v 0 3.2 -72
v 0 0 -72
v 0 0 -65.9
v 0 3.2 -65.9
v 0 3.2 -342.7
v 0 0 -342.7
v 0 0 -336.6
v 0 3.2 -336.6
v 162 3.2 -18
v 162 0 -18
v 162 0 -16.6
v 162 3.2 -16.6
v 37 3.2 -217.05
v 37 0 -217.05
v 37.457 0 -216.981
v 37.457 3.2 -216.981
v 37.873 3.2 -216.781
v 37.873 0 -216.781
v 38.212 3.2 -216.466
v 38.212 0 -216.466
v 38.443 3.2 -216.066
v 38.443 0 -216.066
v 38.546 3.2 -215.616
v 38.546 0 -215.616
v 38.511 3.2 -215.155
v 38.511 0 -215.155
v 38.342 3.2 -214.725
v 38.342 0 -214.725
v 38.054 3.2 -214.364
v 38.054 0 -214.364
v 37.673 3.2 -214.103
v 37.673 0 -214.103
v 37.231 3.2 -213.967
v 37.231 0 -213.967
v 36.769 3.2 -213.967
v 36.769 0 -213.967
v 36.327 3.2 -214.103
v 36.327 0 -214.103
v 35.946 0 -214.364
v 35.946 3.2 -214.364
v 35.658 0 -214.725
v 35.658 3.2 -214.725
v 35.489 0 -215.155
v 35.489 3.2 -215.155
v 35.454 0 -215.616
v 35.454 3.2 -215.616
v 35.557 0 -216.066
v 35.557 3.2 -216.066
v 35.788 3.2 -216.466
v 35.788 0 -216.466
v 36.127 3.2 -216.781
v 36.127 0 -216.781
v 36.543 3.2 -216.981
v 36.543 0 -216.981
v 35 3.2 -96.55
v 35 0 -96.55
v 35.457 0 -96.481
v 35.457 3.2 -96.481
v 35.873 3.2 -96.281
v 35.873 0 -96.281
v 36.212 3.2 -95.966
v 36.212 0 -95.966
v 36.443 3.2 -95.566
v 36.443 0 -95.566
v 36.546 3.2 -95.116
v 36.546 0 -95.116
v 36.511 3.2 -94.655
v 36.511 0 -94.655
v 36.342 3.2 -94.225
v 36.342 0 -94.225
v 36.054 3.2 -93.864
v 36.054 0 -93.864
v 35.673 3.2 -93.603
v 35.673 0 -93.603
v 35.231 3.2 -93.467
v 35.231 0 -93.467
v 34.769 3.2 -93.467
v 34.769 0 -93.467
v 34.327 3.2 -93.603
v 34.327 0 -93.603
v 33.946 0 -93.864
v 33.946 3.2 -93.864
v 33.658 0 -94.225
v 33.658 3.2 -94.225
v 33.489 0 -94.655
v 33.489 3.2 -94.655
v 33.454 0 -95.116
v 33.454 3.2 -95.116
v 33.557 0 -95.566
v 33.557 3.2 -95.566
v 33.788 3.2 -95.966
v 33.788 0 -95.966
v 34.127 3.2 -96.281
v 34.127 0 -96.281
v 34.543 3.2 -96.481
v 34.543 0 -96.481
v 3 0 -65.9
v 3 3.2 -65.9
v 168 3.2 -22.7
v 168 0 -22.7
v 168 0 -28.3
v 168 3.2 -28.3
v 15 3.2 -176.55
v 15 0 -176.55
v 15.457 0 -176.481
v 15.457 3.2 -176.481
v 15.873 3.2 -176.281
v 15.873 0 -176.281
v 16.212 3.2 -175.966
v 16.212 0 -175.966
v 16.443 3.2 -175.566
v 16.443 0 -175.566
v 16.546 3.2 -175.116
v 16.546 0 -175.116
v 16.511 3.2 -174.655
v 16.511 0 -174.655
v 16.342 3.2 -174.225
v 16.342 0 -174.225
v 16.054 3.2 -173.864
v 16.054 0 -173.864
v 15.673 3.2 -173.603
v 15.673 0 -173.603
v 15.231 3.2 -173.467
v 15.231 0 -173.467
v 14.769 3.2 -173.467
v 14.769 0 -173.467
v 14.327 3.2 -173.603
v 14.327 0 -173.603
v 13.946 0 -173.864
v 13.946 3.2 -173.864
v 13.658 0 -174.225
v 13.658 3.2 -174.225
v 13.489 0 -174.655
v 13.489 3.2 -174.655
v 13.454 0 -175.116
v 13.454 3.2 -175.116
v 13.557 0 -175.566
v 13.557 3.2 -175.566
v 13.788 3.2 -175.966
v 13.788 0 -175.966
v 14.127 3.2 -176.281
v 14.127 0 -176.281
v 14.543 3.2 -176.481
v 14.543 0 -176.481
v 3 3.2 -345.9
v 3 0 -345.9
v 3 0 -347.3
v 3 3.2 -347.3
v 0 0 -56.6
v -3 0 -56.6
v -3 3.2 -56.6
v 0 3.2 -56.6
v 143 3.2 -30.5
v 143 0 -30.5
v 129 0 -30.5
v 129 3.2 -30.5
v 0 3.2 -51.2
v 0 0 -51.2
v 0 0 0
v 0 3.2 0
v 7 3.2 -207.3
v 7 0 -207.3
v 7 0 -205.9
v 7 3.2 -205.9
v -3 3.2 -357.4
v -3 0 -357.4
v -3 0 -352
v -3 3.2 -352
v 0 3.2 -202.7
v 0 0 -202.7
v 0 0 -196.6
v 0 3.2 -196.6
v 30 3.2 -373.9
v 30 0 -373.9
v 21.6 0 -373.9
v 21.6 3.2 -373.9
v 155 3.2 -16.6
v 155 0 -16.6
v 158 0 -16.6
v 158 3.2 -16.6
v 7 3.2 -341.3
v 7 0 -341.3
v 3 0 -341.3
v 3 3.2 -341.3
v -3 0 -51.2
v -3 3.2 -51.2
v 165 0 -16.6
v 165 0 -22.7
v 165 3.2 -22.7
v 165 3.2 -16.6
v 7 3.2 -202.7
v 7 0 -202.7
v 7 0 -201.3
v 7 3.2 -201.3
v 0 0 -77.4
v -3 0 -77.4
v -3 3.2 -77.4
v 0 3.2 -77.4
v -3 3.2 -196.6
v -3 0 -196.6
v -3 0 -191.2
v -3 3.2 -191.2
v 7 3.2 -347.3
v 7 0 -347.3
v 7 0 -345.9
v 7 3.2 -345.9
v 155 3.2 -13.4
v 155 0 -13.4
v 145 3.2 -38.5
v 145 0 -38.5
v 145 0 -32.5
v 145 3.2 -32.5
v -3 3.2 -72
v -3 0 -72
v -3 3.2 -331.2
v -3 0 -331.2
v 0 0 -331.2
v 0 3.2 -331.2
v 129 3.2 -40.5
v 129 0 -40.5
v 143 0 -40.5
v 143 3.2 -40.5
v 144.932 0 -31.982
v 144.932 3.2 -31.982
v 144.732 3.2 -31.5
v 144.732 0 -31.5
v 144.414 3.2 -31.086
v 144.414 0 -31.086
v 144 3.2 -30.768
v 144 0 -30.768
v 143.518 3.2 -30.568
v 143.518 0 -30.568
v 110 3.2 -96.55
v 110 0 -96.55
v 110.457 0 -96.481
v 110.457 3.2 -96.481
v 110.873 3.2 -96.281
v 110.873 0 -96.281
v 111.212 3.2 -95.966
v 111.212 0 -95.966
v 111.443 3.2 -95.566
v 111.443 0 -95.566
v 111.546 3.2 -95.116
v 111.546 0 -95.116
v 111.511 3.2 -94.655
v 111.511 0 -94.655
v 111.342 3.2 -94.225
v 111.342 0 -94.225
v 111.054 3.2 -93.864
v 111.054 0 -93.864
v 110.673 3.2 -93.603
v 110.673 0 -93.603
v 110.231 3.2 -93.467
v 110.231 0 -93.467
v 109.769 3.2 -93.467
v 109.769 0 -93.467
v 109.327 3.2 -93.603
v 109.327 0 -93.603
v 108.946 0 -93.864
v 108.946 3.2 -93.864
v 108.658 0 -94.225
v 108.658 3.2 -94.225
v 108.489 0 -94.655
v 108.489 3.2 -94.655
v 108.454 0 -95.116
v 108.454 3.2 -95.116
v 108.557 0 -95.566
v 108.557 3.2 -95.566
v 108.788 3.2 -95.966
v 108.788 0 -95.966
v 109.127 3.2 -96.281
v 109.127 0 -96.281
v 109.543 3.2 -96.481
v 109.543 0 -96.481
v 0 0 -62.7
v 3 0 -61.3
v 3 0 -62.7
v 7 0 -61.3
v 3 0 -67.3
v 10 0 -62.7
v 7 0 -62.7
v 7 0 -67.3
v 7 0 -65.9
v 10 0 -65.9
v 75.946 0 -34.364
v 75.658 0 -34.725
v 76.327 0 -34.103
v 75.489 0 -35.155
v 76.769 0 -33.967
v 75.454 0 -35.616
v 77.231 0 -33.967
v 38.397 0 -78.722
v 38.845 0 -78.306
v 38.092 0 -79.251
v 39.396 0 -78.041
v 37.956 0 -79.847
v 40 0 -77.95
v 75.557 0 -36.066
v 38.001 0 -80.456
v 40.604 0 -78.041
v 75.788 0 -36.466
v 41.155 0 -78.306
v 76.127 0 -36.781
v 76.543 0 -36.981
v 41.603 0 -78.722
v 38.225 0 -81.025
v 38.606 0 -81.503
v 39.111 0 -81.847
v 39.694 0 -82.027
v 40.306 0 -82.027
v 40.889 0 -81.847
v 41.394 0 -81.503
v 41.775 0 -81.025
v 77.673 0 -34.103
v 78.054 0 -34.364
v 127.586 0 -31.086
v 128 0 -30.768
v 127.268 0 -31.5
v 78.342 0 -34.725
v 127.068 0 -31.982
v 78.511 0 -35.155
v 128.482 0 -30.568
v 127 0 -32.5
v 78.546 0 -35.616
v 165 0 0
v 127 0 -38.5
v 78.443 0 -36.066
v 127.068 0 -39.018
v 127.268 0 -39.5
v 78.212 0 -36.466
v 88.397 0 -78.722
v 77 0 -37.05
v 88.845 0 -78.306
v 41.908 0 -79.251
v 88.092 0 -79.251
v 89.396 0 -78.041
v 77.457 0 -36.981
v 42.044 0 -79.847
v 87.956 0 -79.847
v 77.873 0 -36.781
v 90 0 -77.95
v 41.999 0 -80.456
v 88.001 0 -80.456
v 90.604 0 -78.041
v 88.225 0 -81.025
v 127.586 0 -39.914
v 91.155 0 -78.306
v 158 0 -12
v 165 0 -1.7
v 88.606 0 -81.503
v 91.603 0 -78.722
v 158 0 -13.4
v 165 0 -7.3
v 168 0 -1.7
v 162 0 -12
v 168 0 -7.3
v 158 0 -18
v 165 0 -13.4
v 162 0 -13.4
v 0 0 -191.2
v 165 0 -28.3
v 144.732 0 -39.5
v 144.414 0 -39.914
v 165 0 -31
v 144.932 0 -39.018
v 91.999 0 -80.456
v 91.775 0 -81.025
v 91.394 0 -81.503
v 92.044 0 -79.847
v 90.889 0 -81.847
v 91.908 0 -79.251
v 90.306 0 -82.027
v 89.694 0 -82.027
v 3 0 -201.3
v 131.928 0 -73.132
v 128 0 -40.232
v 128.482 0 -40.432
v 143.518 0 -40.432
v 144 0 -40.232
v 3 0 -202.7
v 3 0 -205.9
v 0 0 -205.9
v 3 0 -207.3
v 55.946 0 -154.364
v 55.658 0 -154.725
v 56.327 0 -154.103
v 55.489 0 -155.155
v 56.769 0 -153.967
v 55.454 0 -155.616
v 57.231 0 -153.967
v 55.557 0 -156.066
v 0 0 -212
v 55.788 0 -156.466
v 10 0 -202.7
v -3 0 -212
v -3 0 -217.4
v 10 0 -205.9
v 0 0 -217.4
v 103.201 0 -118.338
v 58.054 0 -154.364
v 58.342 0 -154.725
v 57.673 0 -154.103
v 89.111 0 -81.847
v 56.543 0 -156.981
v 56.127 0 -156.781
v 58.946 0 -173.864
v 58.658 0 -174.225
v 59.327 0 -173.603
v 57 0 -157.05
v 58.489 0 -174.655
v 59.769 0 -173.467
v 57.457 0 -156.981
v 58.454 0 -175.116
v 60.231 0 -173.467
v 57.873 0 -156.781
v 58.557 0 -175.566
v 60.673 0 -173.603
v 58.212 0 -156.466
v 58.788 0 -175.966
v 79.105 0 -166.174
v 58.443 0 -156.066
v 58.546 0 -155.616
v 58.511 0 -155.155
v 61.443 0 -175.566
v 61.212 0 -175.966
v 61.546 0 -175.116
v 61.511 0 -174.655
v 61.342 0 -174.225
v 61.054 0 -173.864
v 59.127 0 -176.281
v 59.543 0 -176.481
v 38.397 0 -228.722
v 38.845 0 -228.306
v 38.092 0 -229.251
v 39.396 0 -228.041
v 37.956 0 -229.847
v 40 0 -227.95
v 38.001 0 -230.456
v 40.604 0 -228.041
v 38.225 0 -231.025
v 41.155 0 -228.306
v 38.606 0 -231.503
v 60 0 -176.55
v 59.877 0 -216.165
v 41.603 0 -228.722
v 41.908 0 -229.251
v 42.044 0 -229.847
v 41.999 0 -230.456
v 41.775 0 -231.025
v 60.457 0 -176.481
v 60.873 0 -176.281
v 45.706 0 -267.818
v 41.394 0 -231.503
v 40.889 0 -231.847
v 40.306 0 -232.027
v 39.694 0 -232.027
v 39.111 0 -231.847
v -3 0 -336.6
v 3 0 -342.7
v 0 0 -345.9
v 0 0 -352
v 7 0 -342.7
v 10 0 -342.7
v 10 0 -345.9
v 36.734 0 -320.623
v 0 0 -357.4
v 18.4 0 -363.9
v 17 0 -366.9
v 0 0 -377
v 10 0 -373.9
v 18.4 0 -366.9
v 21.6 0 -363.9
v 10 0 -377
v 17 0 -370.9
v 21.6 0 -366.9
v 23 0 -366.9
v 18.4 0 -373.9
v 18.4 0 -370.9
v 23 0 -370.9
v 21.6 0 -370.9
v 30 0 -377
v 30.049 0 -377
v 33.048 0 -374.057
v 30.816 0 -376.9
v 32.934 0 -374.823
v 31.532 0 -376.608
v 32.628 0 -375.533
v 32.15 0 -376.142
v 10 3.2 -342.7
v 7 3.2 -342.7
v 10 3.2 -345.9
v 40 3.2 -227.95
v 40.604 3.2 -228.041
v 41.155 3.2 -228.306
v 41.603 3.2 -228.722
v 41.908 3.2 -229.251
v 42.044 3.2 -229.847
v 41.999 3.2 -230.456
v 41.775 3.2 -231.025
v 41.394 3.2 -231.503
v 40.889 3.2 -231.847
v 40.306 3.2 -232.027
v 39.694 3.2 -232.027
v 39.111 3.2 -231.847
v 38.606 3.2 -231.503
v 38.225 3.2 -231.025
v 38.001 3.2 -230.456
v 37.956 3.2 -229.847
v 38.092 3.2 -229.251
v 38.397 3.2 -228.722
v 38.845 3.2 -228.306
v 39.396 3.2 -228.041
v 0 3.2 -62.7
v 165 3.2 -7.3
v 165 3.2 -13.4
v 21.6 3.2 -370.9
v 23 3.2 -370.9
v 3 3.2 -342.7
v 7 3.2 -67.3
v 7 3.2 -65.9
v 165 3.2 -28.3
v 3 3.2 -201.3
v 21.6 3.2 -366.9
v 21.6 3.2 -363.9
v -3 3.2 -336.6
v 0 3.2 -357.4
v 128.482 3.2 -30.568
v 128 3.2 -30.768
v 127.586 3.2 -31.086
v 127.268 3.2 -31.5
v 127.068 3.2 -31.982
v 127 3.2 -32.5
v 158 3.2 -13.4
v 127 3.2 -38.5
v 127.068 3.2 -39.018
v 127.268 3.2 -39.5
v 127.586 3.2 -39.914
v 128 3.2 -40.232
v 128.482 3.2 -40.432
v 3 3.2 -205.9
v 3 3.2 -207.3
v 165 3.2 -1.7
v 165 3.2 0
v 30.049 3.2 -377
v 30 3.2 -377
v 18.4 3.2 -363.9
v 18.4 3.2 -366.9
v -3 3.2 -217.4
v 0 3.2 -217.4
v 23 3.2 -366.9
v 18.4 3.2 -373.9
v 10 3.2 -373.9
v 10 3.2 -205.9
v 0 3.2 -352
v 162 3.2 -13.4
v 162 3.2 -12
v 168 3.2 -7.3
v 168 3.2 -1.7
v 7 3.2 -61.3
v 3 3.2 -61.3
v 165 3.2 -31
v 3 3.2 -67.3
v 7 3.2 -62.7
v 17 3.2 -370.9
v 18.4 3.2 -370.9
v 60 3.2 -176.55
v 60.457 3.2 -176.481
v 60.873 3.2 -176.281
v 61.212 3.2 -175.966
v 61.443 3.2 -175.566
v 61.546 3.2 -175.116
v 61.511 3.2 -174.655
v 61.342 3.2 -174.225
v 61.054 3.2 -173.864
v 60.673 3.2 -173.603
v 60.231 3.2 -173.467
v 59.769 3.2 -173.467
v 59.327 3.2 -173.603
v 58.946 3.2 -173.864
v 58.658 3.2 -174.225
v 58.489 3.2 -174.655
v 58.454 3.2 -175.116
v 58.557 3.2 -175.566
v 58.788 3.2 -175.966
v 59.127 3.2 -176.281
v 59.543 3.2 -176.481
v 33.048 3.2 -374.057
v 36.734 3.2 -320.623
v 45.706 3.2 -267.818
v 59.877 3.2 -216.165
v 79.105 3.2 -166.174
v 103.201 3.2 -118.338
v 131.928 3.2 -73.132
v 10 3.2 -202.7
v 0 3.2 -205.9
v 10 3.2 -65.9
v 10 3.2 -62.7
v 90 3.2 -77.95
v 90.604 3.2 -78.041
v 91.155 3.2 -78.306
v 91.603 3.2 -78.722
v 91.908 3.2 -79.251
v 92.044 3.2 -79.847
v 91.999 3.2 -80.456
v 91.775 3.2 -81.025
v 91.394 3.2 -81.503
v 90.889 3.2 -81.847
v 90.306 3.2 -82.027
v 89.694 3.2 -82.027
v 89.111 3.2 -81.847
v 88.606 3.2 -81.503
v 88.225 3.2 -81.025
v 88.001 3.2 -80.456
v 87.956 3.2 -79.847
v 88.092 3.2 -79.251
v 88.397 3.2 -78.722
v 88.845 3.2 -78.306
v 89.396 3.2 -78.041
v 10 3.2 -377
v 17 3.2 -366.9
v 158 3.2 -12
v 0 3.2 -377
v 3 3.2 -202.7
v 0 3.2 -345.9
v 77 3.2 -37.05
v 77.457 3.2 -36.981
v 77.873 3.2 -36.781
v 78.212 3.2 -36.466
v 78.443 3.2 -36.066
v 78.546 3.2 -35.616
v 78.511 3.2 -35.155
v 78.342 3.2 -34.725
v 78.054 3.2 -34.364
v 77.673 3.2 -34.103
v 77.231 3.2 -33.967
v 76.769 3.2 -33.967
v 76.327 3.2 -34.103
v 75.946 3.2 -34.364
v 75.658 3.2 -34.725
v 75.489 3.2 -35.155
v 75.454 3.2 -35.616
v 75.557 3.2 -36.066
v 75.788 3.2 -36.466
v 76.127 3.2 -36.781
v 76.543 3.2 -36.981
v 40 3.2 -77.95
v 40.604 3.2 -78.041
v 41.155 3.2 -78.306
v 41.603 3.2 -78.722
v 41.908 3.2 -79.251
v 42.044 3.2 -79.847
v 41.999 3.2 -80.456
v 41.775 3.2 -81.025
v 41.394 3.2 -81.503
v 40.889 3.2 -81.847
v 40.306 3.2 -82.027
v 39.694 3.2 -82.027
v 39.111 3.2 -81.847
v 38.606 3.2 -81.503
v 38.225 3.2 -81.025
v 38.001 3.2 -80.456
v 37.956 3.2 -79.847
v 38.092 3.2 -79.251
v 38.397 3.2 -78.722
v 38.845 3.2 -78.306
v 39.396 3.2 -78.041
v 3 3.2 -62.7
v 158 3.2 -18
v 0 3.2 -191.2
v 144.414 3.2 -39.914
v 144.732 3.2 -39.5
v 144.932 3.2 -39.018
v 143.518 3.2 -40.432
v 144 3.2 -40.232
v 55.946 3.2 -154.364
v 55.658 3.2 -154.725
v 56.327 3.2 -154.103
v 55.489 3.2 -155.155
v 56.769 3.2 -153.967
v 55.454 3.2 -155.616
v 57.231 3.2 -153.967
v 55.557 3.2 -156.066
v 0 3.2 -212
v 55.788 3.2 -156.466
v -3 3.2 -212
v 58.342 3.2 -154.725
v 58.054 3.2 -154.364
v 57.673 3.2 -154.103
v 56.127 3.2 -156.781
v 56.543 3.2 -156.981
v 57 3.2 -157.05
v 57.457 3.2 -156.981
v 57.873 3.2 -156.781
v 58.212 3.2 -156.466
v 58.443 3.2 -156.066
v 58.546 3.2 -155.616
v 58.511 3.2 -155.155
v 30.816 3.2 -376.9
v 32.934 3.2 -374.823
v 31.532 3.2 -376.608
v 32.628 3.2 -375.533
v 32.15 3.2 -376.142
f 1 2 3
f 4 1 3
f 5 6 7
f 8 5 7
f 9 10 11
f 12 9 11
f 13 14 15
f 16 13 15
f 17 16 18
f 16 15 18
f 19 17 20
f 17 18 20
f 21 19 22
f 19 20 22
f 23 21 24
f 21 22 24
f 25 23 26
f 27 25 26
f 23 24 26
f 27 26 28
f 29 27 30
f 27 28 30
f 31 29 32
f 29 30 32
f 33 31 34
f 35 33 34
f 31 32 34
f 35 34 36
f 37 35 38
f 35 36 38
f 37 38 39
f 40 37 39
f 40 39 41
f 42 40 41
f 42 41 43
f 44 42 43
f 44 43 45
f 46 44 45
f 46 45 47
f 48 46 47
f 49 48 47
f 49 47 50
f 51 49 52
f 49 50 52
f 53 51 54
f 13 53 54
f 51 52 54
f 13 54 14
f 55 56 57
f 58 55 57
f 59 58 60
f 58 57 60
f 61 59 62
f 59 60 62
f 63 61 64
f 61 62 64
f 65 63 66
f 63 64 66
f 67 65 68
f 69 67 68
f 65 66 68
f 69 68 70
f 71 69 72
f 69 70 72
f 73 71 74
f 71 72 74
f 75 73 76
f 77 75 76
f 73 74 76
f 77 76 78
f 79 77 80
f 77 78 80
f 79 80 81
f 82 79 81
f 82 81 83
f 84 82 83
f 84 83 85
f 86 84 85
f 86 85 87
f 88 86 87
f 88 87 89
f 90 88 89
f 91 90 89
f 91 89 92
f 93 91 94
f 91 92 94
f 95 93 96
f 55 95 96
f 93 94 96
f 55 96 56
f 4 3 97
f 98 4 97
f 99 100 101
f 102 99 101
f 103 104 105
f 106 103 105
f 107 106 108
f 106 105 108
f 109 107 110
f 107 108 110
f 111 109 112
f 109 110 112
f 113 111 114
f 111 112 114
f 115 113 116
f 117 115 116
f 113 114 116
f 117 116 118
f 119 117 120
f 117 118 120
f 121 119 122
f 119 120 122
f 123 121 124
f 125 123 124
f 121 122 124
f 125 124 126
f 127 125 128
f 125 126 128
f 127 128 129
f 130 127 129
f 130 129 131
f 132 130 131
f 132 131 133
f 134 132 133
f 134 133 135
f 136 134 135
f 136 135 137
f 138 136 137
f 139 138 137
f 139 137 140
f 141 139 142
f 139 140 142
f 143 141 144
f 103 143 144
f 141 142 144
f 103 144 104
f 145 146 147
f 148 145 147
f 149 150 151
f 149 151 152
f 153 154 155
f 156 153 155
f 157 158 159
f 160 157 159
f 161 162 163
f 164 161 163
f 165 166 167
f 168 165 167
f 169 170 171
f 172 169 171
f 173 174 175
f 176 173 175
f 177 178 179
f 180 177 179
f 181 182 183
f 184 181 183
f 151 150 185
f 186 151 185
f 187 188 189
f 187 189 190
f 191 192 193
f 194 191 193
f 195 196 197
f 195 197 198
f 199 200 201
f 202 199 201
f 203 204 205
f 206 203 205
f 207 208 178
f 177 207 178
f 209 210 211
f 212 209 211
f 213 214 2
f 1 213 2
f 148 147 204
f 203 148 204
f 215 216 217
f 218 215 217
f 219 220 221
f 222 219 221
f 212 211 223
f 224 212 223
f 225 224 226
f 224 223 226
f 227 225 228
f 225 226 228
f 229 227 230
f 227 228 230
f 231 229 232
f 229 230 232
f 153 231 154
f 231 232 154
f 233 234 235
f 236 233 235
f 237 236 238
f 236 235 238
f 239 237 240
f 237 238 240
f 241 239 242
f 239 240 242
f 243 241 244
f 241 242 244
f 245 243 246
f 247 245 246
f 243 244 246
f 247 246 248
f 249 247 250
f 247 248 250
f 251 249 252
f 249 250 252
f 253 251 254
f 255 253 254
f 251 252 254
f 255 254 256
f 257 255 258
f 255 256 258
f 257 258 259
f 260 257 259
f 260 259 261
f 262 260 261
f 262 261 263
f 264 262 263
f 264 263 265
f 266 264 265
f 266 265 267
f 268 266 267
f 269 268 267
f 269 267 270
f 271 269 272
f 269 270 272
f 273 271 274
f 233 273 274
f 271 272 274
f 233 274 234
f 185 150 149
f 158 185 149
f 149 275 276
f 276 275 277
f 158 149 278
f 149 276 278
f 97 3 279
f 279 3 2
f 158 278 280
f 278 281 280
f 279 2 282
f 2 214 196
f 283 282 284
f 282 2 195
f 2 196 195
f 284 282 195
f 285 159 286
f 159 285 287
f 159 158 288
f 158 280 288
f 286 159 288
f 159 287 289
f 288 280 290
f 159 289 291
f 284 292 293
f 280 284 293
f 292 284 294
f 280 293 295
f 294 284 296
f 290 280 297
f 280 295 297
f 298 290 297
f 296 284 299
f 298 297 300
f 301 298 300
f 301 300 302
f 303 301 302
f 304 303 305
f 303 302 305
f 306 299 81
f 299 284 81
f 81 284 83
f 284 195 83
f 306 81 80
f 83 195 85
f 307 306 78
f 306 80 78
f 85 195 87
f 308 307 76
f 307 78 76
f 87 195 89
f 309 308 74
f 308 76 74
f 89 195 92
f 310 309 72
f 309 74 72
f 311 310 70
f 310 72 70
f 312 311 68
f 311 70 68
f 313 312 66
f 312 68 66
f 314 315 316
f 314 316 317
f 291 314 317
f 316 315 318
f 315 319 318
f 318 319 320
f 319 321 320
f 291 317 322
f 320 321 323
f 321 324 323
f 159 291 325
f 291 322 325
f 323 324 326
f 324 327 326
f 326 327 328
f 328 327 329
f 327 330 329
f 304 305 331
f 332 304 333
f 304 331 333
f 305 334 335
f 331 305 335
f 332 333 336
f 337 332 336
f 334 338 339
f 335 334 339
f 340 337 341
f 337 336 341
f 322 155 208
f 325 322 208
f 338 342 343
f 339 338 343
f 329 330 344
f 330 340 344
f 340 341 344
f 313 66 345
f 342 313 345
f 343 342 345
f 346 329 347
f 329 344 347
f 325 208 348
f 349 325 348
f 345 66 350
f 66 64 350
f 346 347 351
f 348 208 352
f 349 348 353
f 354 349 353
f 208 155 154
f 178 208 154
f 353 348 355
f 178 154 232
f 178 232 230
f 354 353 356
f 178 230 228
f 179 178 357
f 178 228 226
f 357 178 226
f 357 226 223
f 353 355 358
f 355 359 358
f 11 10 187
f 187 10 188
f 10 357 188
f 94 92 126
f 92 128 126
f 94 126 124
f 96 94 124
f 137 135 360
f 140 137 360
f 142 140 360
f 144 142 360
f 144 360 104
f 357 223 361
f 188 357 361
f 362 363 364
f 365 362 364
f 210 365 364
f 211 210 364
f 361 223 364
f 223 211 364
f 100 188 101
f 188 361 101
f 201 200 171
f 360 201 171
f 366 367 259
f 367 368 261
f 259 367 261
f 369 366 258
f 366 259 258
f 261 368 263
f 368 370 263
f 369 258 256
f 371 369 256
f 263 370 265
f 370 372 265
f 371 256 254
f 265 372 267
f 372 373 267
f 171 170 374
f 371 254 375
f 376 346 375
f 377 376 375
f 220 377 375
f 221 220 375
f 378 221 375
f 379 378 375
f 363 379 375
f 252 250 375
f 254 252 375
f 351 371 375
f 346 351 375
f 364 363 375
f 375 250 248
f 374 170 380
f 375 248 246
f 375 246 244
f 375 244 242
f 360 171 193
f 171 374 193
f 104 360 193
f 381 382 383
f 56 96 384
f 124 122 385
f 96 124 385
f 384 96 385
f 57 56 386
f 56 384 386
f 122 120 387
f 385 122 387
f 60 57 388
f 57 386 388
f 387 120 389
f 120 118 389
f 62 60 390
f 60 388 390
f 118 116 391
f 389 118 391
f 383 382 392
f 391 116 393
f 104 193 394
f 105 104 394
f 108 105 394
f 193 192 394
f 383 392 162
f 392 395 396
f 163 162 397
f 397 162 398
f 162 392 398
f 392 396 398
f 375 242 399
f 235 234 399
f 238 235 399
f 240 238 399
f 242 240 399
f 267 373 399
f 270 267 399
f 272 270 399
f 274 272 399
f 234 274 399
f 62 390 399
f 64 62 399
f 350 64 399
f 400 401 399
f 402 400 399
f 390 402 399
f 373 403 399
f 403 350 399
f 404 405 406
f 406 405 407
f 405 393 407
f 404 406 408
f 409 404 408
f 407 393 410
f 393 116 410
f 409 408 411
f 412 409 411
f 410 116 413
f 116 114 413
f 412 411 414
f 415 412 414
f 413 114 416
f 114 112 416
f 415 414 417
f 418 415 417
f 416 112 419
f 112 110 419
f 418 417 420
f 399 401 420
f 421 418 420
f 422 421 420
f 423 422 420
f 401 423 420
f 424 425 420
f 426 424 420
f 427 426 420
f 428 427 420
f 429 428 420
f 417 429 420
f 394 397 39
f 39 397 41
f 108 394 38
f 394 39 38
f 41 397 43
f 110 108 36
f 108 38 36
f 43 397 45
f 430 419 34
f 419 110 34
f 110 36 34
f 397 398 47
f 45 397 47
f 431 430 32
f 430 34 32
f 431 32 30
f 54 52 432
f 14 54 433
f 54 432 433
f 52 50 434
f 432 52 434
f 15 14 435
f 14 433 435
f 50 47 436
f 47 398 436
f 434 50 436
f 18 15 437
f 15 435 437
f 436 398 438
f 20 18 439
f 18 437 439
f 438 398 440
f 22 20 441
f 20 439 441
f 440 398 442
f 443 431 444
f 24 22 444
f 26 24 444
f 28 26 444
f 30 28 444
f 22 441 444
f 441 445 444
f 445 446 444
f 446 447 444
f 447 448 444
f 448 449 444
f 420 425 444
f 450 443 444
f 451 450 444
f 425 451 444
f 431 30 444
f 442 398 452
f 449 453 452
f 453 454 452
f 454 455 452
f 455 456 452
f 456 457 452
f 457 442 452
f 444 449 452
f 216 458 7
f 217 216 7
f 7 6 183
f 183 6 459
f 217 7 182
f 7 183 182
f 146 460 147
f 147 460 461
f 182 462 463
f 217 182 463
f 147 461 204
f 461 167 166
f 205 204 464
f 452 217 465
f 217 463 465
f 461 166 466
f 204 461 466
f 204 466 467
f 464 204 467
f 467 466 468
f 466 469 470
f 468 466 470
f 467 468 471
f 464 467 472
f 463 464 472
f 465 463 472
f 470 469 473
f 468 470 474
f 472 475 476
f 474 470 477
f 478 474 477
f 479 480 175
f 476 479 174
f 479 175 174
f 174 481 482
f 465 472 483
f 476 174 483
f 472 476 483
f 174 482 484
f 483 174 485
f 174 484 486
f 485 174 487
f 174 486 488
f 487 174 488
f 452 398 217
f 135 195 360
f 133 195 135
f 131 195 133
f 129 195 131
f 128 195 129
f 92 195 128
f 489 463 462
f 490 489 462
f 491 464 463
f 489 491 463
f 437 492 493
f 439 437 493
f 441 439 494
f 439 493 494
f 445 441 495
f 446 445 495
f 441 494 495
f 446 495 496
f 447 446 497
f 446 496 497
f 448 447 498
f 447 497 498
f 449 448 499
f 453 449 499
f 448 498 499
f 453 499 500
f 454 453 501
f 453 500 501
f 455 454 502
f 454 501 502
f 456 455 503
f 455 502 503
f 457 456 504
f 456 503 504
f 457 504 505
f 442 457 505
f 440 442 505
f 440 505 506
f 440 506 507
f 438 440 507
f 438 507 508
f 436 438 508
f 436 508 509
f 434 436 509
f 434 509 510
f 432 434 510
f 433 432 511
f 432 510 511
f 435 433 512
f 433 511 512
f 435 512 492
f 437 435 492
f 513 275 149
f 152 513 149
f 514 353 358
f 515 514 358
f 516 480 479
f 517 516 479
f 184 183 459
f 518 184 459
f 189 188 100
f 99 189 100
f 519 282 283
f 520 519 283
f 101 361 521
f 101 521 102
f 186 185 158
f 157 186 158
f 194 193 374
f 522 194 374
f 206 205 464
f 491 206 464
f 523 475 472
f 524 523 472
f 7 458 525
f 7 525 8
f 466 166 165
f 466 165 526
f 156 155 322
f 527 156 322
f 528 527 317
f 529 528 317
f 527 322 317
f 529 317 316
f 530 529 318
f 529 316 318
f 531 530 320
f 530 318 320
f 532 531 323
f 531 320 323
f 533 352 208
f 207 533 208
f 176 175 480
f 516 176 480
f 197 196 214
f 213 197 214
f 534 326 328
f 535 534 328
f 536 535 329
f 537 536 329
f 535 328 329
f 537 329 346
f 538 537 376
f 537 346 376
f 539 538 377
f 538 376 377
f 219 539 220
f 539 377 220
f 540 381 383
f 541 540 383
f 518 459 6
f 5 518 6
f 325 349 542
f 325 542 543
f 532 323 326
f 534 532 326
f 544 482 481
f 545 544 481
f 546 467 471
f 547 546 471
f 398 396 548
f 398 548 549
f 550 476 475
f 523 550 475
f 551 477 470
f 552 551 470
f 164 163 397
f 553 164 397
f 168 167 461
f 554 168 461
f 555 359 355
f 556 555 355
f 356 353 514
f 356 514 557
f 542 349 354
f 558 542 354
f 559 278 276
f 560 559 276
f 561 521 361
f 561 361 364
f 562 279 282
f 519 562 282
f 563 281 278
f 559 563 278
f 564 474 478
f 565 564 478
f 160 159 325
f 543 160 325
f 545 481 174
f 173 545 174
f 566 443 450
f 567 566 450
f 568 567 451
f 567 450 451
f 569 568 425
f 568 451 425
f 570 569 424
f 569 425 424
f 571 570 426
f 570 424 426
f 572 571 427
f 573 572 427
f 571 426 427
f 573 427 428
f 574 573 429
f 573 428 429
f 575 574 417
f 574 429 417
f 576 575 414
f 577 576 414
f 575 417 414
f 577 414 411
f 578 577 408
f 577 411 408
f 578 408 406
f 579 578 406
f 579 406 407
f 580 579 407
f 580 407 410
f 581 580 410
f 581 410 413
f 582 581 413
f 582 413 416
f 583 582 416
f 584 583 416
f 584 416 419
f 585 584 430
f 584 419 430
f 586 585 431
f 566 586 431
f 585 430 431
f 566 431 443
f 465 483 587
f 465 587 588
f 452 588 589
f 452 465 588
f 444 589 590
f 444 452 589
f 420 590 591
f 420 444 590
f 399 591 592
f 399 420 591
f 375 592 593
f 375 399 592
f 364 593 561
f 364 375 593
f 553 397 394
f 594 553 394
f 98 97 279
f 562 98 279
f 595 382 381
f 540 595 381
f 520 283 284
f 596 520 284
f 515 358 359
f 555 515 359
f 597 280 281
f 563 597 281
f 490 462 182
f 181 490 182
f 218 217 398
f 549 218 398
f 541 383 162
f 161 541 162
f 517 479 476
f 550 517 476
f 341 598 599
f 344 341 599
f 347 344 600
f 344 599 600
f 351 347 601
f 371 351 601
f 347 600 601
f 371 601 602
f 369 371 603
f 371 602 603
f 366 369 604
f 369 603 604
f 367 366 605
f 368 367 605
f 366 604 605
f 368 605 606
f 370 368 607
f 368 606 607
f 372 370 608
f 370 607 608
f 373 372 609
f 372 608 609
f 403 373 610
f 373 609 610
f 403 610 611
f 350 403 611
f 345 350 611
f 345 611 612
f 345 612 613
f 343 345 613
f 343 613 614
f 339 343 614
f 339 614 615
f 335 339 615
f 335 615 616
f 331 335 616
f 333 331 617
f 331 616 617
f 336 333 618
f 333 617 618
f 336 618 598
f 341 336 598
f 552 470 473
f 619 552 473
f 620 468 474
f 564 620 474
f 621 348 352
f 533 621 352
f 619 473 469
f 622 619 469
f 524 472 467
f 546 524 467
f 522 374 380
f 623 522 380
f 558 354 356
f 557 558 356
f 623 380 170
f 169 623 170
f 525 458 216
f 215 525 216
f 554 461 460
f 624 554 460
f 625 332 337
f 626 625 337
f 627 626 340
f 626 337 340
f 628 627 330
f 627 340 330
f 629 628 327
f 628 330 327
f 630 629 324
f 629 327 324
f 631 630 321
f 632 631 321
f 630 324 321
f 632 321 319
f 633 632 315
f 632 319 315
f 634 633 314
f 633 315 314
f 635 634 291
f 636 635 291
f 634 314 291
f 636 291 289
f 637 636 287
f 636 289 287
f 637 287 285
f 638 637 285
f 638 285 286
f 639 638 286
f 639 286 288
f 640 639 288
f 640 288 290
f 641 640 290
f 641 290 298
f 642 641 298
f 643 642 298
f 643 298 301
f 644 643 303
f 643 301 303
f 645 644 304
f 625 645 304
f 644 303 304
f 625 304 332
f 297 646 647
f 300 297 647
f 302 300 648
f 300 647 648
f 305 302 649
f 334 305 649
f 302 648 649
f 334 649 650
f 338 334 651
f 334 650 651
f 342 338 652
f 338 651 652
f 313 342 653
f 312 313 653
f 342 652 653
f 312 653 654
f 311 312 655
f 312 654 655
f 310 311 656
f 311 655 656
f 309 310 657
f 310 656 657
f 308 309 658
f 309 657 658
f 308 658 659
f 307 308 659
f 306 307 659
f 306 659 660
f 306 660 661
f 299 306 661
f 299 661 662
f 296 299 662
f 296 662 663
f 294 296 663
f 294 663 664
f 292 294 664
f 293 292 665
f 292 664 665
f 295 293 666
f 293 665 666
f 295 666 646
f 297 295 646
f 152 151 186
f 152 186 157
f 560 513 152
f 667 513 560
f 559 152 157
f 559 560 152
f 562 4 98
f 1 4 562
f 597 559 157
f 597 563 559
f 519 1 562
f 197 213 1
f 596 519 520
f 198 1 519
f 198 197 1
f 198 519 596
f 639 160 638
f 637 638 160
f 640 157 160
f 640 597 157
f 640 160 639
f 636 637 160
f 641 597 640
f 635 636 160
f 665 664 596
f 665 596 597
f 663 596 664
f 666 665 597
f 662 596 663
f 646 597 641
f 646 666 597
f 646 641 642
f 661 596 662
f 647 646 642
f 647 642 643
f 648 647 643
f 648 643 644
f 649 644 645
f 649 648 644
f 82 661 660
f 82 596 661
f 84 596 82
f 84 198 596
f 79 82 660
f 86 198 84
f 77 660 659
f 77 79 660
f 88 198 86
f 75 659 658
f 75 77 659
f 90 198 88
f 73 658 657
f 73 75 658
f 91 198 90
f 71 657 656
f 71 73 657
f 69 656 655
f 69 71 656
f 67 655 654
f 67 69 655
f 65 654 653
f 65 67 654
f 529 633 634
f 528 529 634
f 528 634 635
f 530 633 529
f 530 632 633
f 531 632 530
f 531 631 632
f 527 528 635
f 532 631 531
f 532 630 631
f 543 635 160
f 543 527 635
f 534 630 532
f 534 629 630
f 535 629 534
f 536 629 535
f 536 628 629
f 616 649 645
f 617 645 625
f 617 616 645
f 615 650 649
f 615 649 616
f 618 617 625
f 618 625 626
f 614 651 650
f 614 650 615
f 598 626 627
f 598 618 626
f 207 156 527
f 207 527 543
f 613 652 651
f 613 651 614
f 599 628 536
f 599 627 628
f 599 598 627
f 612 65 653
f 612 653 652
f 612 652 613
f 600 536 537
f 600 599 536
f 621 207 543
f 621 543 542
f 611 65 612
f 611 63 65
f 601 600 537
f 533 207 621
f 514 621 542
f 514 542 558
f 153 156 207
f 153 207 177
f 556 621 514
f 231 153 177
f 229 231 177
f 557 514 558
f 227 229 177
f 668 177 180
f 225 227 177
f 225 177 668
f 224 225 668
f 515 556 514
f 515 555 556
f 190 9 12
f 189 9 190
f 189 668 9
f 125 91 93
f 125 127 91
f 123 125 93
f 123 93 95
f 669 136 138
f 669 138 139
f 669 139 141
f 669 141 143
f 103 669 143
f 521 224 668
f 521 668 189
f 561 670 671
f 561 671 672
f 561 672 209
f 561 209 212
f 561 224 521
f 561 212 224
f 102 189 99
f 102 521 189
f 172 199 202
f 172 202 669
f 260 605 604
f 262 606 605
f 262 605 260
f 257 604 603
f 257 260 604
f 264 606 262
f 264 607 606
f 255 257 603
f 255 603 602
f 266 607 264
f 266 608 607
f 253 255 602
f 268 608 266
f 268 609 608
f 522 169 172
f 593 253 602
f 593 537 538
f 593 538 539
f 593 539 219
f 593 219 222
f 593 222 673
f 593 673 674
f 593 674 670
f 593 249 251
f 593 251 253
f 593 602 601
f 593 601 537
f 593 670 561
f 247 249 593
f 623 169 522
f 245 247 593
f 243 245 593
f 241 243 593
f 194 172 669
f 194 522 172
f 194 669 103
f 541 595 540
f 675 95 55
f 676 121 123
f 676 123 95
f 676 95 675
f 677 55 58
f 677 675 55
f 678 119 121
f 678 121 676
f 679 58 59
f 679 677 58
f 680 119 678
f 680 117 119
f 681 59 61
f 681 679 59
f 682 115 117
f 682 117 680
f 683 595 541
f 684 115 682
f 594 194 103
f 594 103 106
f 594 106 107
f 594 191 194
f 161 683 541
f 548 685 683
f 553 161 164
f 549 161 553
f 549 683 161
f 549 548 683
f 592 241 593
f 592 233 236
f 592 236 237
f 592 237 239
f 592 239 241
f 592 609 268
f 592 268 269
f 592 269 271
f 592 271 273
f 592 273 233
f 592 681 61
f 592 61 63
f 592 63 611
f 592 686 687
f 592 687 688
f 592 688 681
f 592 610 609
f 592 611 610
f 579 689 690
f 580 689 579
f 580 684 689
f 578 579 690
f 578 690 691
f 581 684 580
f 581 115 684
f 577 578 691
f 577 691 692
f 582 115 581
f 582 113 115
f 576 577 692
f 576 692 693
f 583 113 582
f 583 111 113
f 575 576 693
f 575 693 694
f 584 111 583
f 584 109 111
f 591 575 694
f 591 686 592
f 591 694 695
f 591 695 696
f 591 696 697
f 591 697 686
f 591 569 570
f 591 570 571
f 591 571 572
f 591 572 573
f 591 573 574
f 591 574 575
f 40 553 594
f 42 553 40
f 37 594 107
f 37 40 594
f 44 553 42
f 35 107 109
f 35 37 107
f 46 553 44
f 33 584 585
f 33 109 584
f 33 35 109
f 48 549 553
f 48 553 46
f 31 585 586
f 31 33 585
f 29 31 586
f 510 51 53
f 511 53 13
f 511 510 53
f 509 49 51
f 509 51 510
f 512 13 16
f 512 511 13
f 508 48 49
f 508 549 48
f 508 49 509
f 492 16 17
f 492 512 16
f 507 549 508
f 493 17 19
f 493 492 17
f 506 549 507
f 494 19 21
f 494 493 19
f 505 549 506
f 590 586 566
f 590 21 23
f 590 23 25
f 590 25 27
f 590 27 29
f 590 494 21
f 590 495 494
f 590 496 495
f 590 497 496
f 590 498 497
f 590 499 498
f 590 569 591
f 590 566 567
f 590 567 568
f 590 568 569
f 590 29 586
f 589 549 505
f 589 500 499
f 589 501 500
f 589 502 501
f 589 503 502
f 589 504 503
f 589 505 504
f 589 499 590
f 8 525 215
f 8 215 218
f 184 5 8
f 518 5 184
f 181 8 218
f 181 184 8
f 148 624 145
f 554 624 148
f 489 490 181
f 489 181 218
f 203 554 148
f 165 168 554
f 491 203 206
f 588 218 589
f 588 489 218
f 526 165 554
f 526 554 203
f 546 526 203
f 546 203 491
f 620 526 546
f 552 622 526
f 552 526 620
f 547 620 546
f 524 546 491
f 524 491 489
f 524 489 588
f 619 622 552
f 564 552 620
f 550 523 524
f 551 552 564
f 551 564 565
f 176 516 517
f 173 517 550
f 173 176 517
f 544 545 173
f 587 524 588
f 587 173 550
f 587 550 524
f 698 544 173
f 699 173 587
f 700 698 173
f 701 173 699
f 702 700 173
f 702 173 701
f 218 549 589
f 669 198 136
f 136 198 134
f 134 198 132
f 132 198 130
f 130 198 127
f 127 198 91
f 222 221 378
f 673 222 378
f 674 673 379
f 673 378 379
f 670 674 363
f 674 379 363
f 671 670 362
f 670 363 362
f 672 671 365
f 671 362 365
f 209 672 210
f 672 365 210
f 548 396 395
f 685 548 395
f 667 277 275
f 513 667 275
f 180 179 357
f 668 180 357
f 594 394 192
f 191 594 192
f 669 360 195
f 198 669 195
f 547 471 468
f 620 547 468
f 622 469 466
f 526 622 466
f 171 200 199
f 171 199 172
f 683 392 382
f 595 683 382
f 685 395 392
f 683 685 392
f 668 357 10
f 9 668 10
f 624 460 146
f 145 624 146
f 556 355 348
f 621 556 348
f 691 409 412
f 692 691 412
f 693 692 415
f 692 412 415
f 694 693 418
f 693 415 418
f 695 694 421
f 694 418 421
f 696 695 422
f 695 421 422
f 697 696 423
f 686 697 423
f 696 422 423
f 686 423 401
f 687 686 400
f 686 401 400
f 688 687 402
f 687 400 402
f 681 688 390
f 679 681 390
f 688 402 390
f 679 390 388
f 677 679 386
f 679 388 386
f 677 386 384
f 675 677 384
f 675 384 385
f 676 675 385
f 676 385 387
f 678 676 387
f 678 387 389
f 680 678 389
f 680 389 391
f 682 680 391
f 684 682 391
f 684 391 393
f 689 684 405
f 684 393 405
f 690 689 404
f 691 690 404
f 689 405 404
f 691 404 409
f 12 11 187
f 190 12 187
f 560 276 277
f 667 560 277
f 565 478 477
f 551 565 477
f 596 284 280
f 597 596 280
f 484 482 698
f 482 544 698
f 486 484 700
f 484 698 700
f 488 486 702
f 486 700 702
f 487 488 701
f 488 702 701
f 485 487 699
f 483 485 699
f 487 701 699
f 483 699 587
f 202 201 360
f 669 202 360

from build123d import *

# Parameters (mm, degrees)
SALIENTE_EXTRUIR1_DEPTH = 3.2
CORTAR_EXTRUIR1_DEPTH   = 3.2
REDONDEO1_R             = 3
CROQUIS3_R              = 2.05
CORTAR_EXTRUIR2_DEPTH   = 3.2
CORTAR_EXTRUIR3_DEPTH   = 3.2
CROQUIS5_R              = 1.55
CORTAR_EXTRUIR4_DEPTH   = 3.2
CROQUIS6_W              = 3
CROQUIS6_H              = 0.2
CORTAR_EXTRUIR5_DEPTH   = 3.2


with BuildPart() as part:
    # Croquis1 → Saliente-Extruir1 (new body)
    with BuildSketch(Plane(origin=(0, 0, 0), x_dir=(1, 0, 0), z_dir=(0, 1, 0))):
        Polygon((7, 65.9), (10, 65.9), (10, 62.7), (7, 62.7), (7, 61.3), (3, 61.3), (3, 62.7), (0, 62.7), (0, 56.8), (-3, 56.8), (-3, 51), (0, 51), (0, 0), (165, 0), (165, 1.5), (168, 1.5), (168, 7.5), (165, 7.5), (165, 13.4), (162, 13.4), (162, 12), (158, 12), (158, 13.4), (155, 13.4), (155, 16.6), (158, 16.6), (158, 18), (162, 18), (162, 16.6), (165, 16.6), (165, 22.5), (168, 22.5), (168, 28.5), (165, 28.5), (165, 377), (30, 377), (30, 373.9), (21.6, 373.9), (21.6, 370.9), (23, 370.9), (23, 366.9), (21.6, 366.9), (21.6, 363.9), (18.4, 363.9), (18.4, 366.9), (17, 366.9), (17, 370.9), (18.4, 370.9), (18.4, 373.9), (10, 373.9), (10, 377), (0, 377), (0, 357.6), (-3, 357.6), (-3, 351.8), (0, 351.8), (0, 345.9), (3, 345.9), (3, 347.3), (7, 347.3), (7, 345.9), (10, 345.9), (10, 342.7), (7, 342.7), (7, 341.3), (3, 341.3), (3, 342.7), (0, 342.7), (0, 336.8), (-3, 336.8), (-3, 331), (0, 331), (0, 217.6), (-3, 217.6), (-3, 211.8), (0, 211.8), (0, 205.9), (3, 205.9), (3, 207.3), (7, 207.3), (7, 205.9), (10, 205.9), (10, 202.7), (7, 202.7), (7, 201.3), (3, 201.3), (3, 202.7), (0, 202.7), (0, 196.8), (-3, 196.8), (-3, 191), (0, 191), (0, 77.6), (-3, 77.6), (-3, 71.8), (0, 71.8), (0, 65.9), (3, 65.9), (3, 67.3), (7, 67.3), align=None)
    extrude(amount=SALIENTE_EXTRUIR1_DEPTH)

    # Croquis2 → Cortar-Extruir1 (cut)
    with BuildSketch(Plane.XZ):
        with BuildLine():
            Line((165, -377), (33, -377))
            ThreePointArc((33, -377), (68.343071274, -192.304293087), (165, -31))
            Line((165, -31), (165, -377))
        make_face()
    extrude(amount=-CORTAR_EXTRUIR1_DEPTH, mode=Mode.SUBTRACT)

    # Redondeo1
    redondeo1_edges = [part.edges().sort_by_distance(p)[0] for p in [
        (33, 1.6, -377),
    ]]
    fillet(redondeo1_edges, radius=REDONDEO1_R)

    # Croquis3 → Cortar-Extruir2 (cut)
    with BuildSketch(Plane(origin=(0, 3.2, 0), x_dir=(1, 0, 0), z_dir=(0, 1, 0))):
        with Locations(Location((40, 80, 0), (0, 0, 270))):
            Circle(CROQUIS3_R)
        with Locations(Location((90, 80, 0), (0, 0, 270))):
            Circle(CROQUIS3_R)
        with Locations(Location((40, 230, 0), (0, 0, 270))):
            Circle(CROQUIS3_R)
    extrude(amount=-CORTAR_EXTRUIR2_DEPTH, mode=Mode.SUBTRACT)

    # Croquis4 → Cortar-Extruir3 (cut)
    with BuildSketch(Plane.XZ):
        with BuildLine():
            Line((143, -30.5), (129, -30.5))
            ThreePointArc((129, -30.5), (127.585786438, -31.085786438), (127, -32.5))
            Line((127, -32.5), (127, -38.5))
            ThreePointArc((127, -38.5), (127.585786438, -39.914213562), (129, -40.5))
            Line((129, -40.5), (143, -40.5))
            ThreePointArc((143, -40.5), (144.414213562, -39.914213562), (145, -38.5))
            Line((145, -38.5), (145, -32.5))
            ThreePointArc((145, -32.5), (144.414213562, -31.085786438), (143, -30.5))
        make_face()
    extrude(amount=-CORTAR_EXTRUIR3_DEPTH, mode=Mode.SUBTRACT)

    # Croquis5 → Cortar-Extruir4 (cut)
    with BuildSketch(Plane.XZ):
        with Locations(Location((110, -95, 0), (0, 0, 270))):
            Circle(CROQUIS5_R)
        with Locations(Location((35, -95, 0), (0, 0, 270))):
            Circle(CROQUIS5_R)
        with Locations(Location((15, -175, 0), (0, 0, 270))):
            Circle(CROQUIS5_R)
        with Locations(Location((60, -175, 0), (0, 0, 270))):
            Circle(CROQUIS5_R)
        with Locations(Location((77, -35.5, 0), (0, 0, 270))):
            Circle(CROQUIS5_R)
        with Locations(Location((37, -215.5, 0), (0, 0, 270))):
            Circle(CROQUIS5_R)
        with Locations(Location((57, -155.5, 0), (0, 0, 270))):
            Circle(CROQUIS5_R)
    extrude(amount=-CORTAR_EXTRUIR4_DEPTH, mode=Mode.SUBTRACT)

    # Croquis6 → Cortar-Extruir5 (cut)
    with BuildSketch(Plane.XZ):
        with Locations((-1.5, -357.5)):
            Rectangle(CROQUIS6_W, CROQUIS6_H)
        with Locations((-1.5, -351.9)):
            Rectangle(CROQUIS6_W, CROQUIS6_H)
        with Locations((-1.5, -336.7)):
            Rectangle(CROQUIS6_W, CROQUIS6_H)
        with Locations((-1.5, -331.1)):
            Rectangle(CROQUIS6_W, CROQUIS6_H)
        with Locations((-1.5, -217.5)):
            Rectangle(CROQUIS6_W, CROQUIS6_H)
        with Locations((-1.5, -211.9)):
            Rectangle(CROQUIS6_W, CROQUIS6_H)
        with Locations((-1.5, -196.7)):
            Rectangle(CROQUIS6_W, CROQUIS6_H)
        with Locations((-1.5, -191.1)):
            Rectangle(CROQUIS6_W, CROQUIS6_H)
        with Locations((-1.5, -77.5)):
            Rectangle(CROQUIS6_W, CROQUIS6_H)
        with Locations((-1.5, -71.9)):
            Rectangle(CROQUIS6_W, CROQUIS6_H)
        with Locations((-1.5, -56.7)):
            Rectangle(CROQUIS6_W, CROQUIS6_H)
        with Locations((-1.5, -51.1)):
            Rectangle(CROQUIS6_W, CROQUIS6_H)
        with Locations((166.5, -28.4)):
            Rectangle(CROQUIS6_W, CROQUIS6_H)
        with Locations((166.5, -22.6)):
            Rectangle(CROQUIS6_W, CROQUIS6_H)
        with Locations((166.5, -7.4)):
            Rectangle(CROQUIS6_W, CROQUIS6_H)
        with Locations((166.5, -1.6)):
            Rectangle(CROQUIS6_W, CROQUIS6_H)
    extrude(amount=-CORTAR_EXTRUIR5_DEPTH, mode=Mode.SUBTRACT)


solid = part.part
